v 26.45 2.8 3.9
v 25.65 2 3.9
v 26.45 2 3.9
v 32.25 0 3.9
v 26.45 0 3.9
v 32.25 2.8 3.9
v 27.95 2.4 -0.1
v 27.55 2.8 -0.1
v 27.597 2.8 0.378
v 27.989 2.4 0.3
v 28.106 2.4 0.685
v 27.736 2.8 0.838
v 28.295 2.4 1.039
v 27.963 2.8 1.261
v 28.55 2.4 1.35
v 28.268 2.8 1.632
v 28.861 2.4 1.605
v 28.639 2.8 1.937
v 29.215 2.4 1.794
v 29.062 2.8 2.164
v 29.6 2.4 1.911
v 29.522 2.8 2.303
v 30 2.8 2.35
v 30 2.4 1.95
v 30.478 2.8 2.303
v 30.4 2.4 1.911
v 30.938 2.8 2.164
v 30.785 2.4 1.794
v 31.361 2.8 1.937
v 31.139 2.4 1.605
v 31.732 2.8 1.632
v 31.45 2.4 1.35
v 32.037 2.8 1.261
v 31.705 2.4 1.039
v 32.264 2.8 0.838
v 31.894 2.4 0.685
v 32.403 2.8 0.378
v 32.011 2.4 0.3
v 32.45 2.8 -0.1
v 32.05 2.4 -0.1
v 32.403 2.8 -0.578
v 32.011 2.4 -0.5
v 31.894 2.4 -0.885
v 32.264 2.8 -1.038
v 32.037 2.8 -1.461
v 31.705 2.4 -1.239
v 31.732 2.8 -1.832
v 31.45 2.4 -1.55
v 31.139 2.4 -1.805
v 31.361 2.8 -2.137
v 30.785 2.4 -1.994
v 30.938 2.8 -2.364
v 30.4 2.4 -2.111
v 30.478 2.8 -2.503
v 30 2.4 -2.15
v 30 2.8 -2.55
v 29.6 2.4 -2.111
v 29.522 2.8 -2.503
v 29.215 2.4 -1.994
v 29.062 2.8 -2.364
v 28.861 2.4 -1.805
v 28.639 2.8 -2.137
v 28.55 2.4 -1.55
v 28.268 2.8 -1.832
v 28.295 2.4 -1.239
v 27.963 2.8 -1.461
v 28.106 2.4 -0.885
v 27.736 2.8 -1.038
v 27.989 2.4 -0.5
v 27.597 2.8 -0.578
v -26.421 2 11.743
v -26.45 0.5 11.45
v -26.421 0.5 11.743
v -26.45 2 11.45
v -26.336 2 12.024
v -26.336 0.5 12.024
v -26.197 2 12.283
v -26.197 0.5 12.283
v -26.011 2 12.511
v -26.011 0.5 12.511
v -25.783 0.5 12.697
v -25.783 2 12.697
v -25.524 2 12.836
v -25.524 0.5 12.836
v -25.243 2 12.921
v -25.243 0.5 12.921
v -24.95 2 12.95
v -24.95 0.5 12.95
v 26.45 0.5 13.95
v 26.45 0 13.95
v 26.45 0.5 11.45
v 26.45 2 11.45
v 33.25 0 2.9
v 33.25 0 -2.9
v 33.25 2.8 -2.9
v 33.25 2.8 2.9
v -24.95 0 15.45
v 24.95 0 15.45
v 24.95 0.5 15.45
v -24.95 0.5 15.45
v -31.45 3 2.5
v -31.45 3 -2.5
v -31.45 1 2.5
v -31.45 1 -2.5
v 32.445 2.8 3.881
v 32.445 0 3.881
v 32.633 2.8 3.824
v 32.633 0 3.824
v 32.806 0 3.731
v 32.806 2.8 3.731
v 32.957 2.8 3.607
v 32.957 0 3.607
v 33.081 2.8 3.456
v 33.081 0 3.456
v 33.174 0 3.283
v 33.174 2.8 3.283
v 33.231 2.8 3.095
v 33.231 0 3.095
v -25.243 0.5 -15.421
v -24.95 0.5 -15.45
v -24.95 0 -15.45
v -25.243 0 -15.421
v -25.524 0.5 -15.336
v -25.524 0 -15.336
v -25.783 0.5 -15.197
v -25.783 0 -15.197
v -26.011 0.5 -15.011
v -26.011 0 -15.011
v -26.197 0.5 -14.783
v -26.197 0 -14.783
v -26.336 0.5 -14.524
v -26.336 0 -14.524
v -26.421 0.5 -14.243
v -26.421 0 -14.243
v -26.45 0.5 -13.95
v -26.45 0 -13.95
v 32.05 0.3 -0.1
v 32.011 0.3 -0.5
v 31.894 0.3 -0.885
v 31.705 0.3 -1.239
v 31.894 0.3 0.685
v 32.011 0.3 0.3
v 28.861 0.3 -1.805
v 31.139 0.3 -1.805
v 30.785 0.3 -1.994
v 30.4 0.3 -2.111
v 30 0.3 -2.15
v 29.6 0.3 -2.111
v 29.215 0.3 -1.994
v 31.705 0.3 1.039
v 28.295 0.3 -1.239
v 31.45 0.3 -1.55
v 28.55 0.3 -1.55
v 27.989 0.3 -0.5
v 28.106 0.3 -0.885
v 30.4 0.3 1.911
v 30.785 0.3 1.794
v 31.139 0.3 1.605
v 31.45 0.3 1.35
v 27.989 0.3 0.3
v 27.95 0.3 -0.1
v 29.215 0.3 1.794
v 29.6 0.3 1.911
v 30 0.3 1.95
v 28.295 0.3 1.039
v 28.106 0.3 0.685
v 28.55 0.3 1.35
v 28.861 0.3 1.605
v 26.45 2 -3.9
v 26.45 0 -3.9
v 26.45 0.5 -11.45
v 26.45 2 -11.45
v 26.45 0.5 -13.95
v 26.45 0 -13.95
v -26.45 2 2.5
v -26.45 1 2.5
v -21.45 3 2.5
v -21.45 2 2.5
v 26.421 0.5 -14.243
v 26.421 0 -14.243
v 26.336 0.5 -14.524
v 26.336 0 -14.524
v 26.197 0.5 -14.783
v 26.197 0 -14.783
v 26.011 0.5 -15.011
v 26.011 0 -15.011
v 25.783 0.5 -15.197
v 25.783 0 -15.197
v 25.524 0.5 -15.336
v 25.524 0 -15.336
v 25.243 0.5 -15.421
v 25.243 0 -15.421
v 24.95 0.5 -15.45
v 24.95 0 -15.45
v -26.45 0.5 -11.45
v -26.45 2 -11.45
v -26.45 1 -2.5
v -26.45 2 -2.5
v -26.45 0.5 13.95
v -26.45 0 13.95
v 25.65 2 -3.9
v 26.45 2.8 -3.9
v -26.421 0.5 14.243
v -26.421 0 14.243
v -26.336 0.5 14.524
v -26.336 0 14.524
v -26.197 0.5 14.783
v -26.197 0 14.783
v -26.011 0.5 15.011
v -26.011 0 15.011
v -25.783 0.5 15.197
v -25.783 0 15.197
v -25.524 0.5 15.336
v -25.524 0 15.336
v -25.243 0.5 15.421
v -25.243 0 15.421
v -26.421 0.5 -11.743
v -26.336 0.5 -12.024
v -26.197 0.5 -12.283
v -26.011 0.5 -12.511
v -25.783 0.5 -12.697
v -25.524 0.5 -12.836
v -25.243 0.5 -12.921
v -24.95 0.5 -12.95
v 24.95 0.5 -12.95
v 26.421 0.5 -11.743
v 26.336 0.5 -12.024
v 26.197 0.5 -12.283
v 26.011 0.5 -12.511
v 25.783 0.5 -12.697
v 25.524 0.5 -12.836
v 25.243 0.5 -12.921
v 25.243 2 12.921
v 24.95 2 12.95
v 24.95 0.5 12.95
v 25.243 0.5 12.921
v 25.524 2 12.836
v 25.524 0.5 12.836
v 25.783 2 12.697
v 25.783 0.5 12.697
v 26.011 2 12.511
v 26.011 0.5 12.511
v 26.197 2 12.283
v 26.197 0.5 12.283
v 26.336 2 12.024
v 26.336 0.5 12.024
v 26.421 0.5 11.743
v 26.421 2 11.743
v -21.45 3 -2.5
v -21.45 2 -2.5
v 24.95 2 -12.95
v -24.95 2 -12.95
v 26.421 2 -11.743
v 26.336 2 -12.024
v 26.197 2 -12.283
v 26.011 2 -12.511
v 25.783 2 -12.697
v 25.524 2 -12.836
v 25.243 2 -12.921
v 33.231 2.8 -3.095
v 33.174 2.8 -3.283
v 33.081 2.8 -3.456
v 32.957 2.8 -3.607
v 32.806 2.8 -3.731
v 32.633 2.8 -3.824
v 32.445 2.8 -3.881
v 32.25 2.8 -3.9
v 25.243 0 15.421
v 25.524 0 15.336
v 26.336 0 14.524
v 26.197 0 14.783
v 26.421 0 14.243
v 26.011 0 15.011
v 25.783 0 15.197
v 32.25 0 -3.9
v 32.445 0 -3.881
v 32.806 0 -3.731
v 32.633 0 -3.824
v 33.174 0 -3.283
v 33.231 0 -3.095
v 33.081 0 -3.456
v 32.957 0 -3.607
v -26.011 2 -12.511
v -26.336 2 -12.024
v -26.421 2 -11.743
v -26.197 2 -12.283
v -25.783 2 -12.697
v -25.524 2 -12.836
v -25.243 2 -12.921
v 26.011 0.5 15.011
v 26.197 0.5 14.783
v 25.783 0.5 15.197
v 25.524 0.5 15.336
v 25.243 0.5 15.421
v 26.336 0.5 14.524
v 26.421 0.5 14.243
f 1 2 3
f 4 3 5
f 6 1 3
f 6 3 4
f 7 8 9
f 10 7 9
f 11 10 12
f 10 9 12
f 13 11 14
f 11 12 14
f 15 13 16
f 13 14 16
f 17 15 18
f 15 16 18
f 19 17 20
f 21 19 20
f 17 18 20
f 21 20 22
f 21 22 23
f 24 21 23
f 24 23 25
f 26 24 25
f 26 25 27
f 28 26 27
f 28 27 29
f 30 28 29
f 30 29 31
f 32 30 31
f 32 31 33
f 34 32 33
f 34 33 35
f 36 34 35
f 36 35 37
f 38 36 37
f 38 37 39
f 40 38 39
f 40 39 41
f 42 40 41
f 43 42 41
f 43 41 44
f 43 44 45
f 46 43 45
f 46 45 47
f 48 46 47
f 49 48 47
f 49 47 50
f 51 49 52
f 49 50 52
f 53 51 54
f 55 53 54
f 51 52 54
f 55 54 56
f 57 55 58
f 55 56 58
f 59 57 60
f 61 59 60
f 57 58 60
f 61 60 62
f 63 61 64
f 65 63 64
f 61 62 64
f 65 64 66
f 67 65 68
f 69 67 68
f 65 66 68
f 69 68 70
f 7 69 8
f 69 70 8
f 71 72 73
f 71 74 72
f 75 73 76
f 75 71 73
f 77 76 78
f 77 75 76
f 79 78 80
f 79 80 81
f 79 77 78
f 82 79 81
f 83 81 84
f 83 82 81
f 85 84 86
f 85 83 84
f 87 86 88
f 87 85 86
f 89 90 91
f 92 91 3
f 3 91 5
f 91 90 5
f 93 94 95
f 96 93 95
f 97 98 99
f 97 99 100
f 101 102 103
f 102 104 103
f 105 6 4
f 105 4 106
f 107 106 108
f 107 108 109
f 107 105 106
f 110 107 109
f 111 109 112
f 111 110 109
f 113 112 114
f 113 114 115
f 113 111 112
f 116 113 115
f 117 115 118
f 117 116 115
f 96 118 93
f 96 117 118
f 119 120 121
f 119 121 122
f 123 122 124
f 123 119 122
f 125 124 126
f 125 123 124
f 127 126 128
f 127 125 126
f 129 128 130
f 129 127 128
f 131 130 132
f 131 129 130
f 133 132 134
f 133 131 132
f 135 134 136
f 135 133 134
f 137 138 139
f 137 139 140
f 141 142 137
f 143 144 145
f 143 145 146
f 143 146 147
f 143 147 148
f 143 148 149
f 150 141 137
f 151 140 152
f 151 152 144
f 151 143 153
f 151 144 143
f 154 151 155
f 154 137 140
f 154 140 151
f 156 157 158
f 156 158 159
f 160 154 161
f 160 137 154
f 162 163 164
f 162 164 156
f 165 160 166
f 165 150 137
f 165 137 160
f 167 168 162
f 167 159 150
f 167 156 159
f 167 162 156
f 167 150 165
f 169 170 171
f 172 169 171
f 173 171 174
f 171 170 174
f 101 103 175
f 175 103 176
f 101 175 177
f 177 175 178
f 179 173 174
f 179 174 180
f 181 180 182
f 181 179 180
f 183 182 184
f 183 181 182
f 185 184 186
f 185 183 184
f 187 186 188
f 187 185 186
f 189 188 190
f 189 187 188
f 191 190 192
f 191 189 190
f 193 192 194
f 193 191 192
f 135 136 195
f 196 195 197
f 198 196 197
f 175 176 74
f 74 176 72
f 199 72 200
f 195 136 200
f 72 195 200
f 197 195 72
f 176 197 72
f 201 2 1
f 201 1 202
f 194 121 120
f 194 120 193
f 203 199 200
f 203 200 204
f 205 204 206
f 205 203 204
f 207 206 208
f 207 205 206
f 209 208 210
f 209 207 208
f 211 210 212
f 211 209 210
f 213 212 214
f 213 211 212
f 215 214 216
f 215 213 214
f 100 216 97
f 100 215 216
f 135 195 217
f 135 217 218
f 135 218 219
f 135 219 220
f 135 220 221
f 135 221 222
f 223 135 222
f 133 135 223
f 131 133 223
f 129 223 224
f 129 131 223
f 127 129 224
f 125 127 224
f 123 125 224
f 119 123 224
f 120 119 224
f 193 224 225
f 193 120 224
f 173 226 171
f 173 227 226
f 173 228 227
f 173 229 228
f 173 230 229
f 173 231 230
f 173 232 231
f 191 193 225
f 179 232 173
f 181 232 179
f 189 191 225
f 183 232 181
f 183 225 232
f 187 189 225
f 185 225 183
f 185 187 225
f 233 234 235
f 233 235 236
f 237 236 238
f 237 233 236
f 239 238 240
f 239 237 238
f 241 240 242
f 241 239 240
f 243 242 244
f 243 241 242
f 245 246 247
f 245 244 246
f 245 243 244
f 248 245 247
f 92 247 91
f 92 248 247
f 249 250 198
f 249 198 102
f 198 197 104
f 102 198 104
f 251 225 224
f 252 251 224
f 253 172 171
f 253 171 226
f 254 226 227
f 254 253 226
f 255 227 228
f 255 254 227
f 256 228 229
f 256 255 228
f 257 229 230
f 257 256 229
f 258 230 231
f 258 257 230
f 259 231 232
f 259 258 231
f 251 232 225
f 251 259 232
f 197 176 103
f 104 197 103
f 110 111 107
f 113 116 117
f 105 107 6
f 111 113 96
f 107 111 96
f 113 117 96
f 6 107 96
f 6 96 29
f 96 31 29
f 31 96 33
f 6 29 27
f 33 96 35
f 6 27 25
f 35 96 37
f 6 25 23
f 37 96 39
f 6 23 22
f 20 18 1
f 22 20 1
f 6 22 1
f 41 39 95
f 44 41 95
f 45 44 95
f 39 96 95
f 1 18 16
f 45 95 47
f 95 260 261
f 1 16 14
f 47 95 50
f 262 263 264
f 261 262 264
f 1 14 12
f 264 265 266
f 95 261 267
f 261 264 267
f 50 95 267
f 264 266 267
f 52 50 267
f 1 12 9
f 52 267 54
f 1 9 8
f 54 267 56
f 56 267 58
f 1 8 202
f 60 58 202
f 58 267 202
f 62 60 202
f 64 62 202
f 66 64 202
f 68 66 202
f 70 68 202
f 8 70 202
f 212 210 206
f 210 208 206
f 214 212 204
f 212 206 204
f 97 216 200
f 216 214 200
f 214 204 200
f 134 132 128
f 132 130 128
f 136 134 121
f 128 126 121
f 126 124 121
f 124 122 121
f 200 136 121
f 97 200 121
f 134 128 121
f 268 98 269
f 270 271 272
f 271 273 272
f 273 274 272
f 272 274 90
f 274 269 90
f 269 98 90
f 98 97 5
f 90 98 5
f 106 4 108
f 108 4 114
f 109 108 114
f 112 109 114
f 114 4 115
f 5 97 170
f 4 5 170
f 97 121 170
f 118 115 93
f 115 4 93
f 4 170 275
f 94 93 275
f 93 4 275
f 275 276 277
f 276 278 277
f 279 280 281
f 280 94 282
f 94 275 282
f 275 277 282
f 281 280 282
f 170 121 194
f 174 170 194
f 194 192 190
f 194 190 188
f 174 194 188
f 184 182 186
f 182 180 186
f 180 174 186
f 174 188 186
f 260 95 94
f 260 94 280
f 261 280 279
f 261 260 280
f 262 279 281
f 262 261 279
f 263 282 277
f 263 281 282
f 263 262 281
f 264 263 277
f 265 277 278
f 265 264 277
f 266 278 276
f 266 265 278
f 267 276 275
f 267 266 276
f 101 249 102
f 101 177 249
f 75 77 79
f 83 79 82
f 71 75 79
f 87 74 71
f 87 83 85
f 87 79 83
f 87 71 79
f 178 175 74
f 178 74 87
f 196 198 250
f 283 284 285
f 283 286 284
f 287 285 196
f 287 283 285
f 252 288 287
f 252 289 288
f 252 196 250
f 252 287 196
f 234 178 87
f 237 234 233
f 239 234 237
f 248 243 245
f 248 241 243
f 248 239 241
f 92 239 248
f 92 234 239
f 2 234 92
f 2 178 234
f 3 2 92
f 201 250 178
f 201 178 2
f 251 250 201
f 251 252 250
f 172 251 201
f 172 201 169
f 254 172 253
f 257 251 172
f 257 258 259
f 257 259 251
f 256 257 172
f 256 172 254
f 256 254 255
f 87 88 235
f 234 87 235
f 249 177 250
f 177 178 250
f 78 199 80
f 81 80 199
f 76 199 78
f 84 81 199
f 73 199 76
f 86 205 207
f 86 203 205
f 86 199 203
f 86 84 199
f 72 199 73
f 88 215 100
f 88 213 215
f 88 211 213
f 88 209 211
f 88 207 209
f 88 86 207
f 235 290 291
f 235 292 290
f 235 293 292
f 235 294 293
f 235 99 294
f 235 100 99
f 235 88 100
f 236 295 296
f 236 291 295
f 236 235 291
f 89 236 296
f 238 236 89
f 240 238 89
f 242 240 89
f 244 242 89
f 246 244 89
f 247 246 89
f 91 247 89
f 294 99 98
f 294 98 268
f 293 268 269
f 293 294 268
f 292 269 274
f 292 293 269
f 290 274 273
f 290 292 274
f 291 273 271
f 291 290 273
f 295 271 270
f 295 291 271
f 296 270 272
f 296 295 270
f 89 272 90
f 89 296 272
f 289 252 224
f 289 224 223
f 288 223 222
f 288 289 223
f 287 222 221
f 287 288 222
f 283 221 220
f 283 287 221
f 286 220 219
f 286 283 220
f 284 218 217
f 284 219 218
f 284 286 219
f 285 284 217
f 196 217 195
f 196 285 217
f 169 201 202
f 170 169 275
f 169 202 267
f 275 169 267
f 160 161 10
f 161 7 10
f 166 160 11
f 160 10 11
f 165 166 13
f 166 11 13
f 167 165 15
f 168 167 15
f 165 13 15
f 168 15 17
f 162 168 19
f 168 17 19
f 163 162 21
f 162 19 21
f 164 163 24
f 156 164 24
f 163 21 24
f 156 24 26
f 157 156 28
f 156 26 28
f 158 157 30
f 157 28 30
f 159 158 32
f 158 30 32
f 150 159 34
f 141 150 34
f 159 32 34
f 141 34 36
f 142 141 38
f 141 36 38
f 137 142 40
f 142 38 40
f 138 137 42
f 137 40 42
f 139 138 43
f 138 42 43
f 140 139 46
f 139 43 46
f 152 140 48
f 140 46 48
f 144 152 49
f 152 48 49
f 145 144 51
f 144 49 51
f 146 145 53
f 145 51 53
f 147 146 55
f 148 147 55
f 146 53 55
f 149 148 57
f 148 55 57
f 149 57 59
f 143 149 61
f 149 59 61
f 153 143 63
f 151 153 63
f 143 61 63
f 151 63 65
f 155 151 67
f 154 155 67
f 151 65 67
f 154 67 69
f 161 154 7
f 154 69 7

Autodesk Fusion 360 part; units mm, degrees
sketch "Sketch1" plane through (0, 0, 0) normal (0, 1, 0) x (1, 0, 0)
  line L0 (26.45, 12.95) -> (-26.45, 12.95)
  line L1 (-26.45, 12.95) -> (-26.45, -12.95)
  line L2 (-26.45, -12.95) -> (26.45, -12.95)
  line L3 (26.45, -12.95) -> (26.45, 12.95)
  line L4 (26.45, 12.95) -> (-26.45, -12.95) construction
  line L5 (-26.45, 12.95) -> (26.45, -12.95) construction
  line L6 (26.45, -15.45) -> (-26.45, -15.45)
  line L7 (-26.45, -15.45) -> (-26.45, 15.45)
  line L8 (-26.45, 15.45) -> (26.45, 15.45)
  line L9 (26.45, 15.45) -> (26.45, -15.45)
  line L10 (26.45, -15.45) -> (-26.45, 15.45) construction
  line L11 (-26.45, -15.45) -> (26.45, 15.45) construction
  dimension "d1" = 52.9
  dimension "d2" = 25.9
  dimension "d9" = 2.5
extrude "Extrude1" add sketch "Sketch1" along normal blind 2 contours L0 L1 L2 L3 L7 L9
sketch "Sketch2" plane through (0, 2, 0) normal (0, 1, 0) x (-1, 0, 0)
  line L0 (-26.45, 12.95) -> (-26.45, -12.95)
  line L1 (-26.45, -12.95) -> (26.45, -12.95)
  line L2 (26.45, -12.95) -> (26.45, 12.95)
  line L3 (26.45, 12.95) -> (-26.45, 12.95)
  line L4 (21.45, -2.5) -> (31.45, -2.5)
  line L5 (31.45, -2.5) -> (31.45, 2.5)
  line L6 (31.45, 2.5) -> (21.45, 2.5)
  line L7 (21.45, 2.5) -> (21.45, -2.5)
  line L8 (21.45, -2.5) -> (31.45, 2.5) construction
  line L9 (31.45, -2.5) -> (21.45, 2.5) construction
  point P0 (26.45, 0)
  dimension "d5" = 10
  dimension "d6" = 5
extrude "Extrude2" add sketch "Sketch2" along normal mid plane 2 contours L2 L4 L5 L6 | L2 L4 L6 L7
extrude "Extrude3" add sketch "Sketch1" along normal blind 0.5
sketch "Sketch3" plane through (0, 0, 0) normal (0, 0, 1) x (1, 0, 0)
  line L0 (26.45, 0.5) -> (-26.45, 0.5)
  line L1 (-26.45, 0.5) -> (-26.45, 2)
  line L2 (-26.45, 2) -> (26.45, 2)
  line L3 (26.45, 2) -> (26.45, 0.5)
  line L4 (26.45, 0) -> (-26.45, 0)
  line L5 (-26.45, 0) -> (-26.45, 0.5)
  line L6 (-26.45, 0.5) -> (26.45, 0.5)
  line L7 (26.45, 0.5) -> (26.45, 0)
  line L8 (26.45, 0) -> (28.55, 0)
  line L9 (28.55, 0) -> (28.55, 2)
  line L10 (28.55, 2) -> (26.45, 2)
  line L11 (26.45, 2) -> (26.45, 0)
  line L12 (28.55, 0) -> (29.55, 0)
  line L13 (29.55, 0) -> (29.55, 5.95)
  line L14 (29.55, 5.95) -> (28.55, 5.95)
  line L15 (28.55, 5.95) -> (28.55, 0)
  line L16 (28.55, 5.95) -> (27.55, 5.95)
  line L17 (27.55, 5.95) -> (27.55, 4.05)
  line L18 (27.55, 4.05) -> (28.55, 4.05)
  line L19 (28.55, 4.05) -> (28.55, 5.95)
  line L20 (28.55, 5.95) -> (27.55, 4.05)
  line L21 (27.55, 5.95) -> (28.55, 4.05) construction
  line L22 (29.55, 5.95) -> (28.4726, 5.3162)
  line L23 (28.4726, 5.3162) -> (31.9726, -0.6338)
  line L24 (31.9726, -0.6338) -> (33.05, 0)
  line L25 (33.05, 0) -> (29.55, 5.95)
  line L26 (33.05, 0) -> (33.05, -1.5)
  line L27 (33.05, -1.5) -> (31.9726, -1.5)
  line L28 (31.9726, -1.5) -> (31.9726, -0.6338)
  line L29 (33.05, 0) -> (29.55, 0) construction
  point P0 (28.05, 5)
  dimension "d12" = 2.1
  dimension "d13" = 2
  dimension "d14" = 1
  dimension "d17" = 3
  dimension "d18" = 1.9
  dimension "d19" = 1
  dimension "d20" = 1.25
  dimension "d21" = 3.5
  dimension "d27" = 1.5
sketch "Sketch4" plane through (0, 0, 0) normal (0, 0, 1) x (1, 0, 0)
  line L0 (26.45, 0.5) -> (-26.45, 0.5)
  line L1 (-26.45, 0.5) -> (-26.45, 2)
  line L2 (-26.45, 2) -> (26.45, 2)
  line L3 (26.45, 2) -> (26.45, 0.5)
  line L4 (26.45, 0) -> (-26.45, 0)
  line L5 (-26.45, 0) -> (-26.45, 0.5)
  line L6 (-26.45, 0.5) -> (26.45, 0.5)
  line L7 (26.45, 0.5) -> (26.45, 0)
  line L8 (28.55, 2) -> (26.45, 2)
  line L9 (26.45, 0) -> (28.55, 0)
  line L10 (28.55, 0) -> (29.55, 0)
  line L11 (29.55, 0) -> (29.55, 5.95)
  line L12 (28.55, 0) -> (28.55, 2)
  line L13 (26.45, 0) -> (33.25, 0)
  line L14 (33.25, 0) -> (33.25, 2.8)
  line L15 (33.25, 2.8) -> (26.45, 2.8)
  line L16 (26.45, 2.8) -> (26.45, 0)
  dimension "d30" = 6.8
  dimension "d34" = 2.8
extrude "Extrude6" add sketch "Sketch4" along normal mid plane 7.8 contours L3 L7 L8 L9 L12 L13 L16 | L8 L10 L11 L12 L13 L15 L16 | L11 L13 L14 L15
sketch "Sketch6" plane through (0, 2.8, 0) normal (0, 1, 0) x (-1, 0, 0)
  line L0 (-26.45, -3.9) -> (-26.45, 3.9)
  line L1 (-26.45, 3.9) -> (-33.25, 3.9)
  line L2 (-33.25, 3.9) -> (-33.25, -3.9)
  line L3 (-33.25, -3.9) -> (-26.45, -3.9)
  circle A0 centre (-30, -0.1) radius 2.05
  dimension "d35" = 4.1
  dimension "d38" = 4
  dimension "d39" = 3.55
extrude "Extrude8" cut sketch "Sketch6" against normal blind 2.5 contours A0
chamfer "Chamfer1" distance 0.4 angle 45 1 edges at (31.9113, 2.8, 0.6413)
chamfer "Chamfer2" distance 0.8 angle 45 1 edges at (26.45, 2, 0)
fillet "Fillet1" radius 1 2 edges at (33.25, 1.4, -3.9) (33.25, 1.4, 3.9)
fillet "Fillet2" radius 1.5 8 edges at (26.45, 1.25, 12.95) (26.45, 0.25, 15.45) (26.45, 1.25, -12.95) (26.45, 0.25, -15.45) (-26.45, 0.25, -15.45) (-26.45, 1.25, -12.95) (-26.45, 0.25, 15.45) (-26.45, 1.25, 12.95)
extrude "Extrude4" [suppressed]
extrude "Extrude5" [suppressed]
